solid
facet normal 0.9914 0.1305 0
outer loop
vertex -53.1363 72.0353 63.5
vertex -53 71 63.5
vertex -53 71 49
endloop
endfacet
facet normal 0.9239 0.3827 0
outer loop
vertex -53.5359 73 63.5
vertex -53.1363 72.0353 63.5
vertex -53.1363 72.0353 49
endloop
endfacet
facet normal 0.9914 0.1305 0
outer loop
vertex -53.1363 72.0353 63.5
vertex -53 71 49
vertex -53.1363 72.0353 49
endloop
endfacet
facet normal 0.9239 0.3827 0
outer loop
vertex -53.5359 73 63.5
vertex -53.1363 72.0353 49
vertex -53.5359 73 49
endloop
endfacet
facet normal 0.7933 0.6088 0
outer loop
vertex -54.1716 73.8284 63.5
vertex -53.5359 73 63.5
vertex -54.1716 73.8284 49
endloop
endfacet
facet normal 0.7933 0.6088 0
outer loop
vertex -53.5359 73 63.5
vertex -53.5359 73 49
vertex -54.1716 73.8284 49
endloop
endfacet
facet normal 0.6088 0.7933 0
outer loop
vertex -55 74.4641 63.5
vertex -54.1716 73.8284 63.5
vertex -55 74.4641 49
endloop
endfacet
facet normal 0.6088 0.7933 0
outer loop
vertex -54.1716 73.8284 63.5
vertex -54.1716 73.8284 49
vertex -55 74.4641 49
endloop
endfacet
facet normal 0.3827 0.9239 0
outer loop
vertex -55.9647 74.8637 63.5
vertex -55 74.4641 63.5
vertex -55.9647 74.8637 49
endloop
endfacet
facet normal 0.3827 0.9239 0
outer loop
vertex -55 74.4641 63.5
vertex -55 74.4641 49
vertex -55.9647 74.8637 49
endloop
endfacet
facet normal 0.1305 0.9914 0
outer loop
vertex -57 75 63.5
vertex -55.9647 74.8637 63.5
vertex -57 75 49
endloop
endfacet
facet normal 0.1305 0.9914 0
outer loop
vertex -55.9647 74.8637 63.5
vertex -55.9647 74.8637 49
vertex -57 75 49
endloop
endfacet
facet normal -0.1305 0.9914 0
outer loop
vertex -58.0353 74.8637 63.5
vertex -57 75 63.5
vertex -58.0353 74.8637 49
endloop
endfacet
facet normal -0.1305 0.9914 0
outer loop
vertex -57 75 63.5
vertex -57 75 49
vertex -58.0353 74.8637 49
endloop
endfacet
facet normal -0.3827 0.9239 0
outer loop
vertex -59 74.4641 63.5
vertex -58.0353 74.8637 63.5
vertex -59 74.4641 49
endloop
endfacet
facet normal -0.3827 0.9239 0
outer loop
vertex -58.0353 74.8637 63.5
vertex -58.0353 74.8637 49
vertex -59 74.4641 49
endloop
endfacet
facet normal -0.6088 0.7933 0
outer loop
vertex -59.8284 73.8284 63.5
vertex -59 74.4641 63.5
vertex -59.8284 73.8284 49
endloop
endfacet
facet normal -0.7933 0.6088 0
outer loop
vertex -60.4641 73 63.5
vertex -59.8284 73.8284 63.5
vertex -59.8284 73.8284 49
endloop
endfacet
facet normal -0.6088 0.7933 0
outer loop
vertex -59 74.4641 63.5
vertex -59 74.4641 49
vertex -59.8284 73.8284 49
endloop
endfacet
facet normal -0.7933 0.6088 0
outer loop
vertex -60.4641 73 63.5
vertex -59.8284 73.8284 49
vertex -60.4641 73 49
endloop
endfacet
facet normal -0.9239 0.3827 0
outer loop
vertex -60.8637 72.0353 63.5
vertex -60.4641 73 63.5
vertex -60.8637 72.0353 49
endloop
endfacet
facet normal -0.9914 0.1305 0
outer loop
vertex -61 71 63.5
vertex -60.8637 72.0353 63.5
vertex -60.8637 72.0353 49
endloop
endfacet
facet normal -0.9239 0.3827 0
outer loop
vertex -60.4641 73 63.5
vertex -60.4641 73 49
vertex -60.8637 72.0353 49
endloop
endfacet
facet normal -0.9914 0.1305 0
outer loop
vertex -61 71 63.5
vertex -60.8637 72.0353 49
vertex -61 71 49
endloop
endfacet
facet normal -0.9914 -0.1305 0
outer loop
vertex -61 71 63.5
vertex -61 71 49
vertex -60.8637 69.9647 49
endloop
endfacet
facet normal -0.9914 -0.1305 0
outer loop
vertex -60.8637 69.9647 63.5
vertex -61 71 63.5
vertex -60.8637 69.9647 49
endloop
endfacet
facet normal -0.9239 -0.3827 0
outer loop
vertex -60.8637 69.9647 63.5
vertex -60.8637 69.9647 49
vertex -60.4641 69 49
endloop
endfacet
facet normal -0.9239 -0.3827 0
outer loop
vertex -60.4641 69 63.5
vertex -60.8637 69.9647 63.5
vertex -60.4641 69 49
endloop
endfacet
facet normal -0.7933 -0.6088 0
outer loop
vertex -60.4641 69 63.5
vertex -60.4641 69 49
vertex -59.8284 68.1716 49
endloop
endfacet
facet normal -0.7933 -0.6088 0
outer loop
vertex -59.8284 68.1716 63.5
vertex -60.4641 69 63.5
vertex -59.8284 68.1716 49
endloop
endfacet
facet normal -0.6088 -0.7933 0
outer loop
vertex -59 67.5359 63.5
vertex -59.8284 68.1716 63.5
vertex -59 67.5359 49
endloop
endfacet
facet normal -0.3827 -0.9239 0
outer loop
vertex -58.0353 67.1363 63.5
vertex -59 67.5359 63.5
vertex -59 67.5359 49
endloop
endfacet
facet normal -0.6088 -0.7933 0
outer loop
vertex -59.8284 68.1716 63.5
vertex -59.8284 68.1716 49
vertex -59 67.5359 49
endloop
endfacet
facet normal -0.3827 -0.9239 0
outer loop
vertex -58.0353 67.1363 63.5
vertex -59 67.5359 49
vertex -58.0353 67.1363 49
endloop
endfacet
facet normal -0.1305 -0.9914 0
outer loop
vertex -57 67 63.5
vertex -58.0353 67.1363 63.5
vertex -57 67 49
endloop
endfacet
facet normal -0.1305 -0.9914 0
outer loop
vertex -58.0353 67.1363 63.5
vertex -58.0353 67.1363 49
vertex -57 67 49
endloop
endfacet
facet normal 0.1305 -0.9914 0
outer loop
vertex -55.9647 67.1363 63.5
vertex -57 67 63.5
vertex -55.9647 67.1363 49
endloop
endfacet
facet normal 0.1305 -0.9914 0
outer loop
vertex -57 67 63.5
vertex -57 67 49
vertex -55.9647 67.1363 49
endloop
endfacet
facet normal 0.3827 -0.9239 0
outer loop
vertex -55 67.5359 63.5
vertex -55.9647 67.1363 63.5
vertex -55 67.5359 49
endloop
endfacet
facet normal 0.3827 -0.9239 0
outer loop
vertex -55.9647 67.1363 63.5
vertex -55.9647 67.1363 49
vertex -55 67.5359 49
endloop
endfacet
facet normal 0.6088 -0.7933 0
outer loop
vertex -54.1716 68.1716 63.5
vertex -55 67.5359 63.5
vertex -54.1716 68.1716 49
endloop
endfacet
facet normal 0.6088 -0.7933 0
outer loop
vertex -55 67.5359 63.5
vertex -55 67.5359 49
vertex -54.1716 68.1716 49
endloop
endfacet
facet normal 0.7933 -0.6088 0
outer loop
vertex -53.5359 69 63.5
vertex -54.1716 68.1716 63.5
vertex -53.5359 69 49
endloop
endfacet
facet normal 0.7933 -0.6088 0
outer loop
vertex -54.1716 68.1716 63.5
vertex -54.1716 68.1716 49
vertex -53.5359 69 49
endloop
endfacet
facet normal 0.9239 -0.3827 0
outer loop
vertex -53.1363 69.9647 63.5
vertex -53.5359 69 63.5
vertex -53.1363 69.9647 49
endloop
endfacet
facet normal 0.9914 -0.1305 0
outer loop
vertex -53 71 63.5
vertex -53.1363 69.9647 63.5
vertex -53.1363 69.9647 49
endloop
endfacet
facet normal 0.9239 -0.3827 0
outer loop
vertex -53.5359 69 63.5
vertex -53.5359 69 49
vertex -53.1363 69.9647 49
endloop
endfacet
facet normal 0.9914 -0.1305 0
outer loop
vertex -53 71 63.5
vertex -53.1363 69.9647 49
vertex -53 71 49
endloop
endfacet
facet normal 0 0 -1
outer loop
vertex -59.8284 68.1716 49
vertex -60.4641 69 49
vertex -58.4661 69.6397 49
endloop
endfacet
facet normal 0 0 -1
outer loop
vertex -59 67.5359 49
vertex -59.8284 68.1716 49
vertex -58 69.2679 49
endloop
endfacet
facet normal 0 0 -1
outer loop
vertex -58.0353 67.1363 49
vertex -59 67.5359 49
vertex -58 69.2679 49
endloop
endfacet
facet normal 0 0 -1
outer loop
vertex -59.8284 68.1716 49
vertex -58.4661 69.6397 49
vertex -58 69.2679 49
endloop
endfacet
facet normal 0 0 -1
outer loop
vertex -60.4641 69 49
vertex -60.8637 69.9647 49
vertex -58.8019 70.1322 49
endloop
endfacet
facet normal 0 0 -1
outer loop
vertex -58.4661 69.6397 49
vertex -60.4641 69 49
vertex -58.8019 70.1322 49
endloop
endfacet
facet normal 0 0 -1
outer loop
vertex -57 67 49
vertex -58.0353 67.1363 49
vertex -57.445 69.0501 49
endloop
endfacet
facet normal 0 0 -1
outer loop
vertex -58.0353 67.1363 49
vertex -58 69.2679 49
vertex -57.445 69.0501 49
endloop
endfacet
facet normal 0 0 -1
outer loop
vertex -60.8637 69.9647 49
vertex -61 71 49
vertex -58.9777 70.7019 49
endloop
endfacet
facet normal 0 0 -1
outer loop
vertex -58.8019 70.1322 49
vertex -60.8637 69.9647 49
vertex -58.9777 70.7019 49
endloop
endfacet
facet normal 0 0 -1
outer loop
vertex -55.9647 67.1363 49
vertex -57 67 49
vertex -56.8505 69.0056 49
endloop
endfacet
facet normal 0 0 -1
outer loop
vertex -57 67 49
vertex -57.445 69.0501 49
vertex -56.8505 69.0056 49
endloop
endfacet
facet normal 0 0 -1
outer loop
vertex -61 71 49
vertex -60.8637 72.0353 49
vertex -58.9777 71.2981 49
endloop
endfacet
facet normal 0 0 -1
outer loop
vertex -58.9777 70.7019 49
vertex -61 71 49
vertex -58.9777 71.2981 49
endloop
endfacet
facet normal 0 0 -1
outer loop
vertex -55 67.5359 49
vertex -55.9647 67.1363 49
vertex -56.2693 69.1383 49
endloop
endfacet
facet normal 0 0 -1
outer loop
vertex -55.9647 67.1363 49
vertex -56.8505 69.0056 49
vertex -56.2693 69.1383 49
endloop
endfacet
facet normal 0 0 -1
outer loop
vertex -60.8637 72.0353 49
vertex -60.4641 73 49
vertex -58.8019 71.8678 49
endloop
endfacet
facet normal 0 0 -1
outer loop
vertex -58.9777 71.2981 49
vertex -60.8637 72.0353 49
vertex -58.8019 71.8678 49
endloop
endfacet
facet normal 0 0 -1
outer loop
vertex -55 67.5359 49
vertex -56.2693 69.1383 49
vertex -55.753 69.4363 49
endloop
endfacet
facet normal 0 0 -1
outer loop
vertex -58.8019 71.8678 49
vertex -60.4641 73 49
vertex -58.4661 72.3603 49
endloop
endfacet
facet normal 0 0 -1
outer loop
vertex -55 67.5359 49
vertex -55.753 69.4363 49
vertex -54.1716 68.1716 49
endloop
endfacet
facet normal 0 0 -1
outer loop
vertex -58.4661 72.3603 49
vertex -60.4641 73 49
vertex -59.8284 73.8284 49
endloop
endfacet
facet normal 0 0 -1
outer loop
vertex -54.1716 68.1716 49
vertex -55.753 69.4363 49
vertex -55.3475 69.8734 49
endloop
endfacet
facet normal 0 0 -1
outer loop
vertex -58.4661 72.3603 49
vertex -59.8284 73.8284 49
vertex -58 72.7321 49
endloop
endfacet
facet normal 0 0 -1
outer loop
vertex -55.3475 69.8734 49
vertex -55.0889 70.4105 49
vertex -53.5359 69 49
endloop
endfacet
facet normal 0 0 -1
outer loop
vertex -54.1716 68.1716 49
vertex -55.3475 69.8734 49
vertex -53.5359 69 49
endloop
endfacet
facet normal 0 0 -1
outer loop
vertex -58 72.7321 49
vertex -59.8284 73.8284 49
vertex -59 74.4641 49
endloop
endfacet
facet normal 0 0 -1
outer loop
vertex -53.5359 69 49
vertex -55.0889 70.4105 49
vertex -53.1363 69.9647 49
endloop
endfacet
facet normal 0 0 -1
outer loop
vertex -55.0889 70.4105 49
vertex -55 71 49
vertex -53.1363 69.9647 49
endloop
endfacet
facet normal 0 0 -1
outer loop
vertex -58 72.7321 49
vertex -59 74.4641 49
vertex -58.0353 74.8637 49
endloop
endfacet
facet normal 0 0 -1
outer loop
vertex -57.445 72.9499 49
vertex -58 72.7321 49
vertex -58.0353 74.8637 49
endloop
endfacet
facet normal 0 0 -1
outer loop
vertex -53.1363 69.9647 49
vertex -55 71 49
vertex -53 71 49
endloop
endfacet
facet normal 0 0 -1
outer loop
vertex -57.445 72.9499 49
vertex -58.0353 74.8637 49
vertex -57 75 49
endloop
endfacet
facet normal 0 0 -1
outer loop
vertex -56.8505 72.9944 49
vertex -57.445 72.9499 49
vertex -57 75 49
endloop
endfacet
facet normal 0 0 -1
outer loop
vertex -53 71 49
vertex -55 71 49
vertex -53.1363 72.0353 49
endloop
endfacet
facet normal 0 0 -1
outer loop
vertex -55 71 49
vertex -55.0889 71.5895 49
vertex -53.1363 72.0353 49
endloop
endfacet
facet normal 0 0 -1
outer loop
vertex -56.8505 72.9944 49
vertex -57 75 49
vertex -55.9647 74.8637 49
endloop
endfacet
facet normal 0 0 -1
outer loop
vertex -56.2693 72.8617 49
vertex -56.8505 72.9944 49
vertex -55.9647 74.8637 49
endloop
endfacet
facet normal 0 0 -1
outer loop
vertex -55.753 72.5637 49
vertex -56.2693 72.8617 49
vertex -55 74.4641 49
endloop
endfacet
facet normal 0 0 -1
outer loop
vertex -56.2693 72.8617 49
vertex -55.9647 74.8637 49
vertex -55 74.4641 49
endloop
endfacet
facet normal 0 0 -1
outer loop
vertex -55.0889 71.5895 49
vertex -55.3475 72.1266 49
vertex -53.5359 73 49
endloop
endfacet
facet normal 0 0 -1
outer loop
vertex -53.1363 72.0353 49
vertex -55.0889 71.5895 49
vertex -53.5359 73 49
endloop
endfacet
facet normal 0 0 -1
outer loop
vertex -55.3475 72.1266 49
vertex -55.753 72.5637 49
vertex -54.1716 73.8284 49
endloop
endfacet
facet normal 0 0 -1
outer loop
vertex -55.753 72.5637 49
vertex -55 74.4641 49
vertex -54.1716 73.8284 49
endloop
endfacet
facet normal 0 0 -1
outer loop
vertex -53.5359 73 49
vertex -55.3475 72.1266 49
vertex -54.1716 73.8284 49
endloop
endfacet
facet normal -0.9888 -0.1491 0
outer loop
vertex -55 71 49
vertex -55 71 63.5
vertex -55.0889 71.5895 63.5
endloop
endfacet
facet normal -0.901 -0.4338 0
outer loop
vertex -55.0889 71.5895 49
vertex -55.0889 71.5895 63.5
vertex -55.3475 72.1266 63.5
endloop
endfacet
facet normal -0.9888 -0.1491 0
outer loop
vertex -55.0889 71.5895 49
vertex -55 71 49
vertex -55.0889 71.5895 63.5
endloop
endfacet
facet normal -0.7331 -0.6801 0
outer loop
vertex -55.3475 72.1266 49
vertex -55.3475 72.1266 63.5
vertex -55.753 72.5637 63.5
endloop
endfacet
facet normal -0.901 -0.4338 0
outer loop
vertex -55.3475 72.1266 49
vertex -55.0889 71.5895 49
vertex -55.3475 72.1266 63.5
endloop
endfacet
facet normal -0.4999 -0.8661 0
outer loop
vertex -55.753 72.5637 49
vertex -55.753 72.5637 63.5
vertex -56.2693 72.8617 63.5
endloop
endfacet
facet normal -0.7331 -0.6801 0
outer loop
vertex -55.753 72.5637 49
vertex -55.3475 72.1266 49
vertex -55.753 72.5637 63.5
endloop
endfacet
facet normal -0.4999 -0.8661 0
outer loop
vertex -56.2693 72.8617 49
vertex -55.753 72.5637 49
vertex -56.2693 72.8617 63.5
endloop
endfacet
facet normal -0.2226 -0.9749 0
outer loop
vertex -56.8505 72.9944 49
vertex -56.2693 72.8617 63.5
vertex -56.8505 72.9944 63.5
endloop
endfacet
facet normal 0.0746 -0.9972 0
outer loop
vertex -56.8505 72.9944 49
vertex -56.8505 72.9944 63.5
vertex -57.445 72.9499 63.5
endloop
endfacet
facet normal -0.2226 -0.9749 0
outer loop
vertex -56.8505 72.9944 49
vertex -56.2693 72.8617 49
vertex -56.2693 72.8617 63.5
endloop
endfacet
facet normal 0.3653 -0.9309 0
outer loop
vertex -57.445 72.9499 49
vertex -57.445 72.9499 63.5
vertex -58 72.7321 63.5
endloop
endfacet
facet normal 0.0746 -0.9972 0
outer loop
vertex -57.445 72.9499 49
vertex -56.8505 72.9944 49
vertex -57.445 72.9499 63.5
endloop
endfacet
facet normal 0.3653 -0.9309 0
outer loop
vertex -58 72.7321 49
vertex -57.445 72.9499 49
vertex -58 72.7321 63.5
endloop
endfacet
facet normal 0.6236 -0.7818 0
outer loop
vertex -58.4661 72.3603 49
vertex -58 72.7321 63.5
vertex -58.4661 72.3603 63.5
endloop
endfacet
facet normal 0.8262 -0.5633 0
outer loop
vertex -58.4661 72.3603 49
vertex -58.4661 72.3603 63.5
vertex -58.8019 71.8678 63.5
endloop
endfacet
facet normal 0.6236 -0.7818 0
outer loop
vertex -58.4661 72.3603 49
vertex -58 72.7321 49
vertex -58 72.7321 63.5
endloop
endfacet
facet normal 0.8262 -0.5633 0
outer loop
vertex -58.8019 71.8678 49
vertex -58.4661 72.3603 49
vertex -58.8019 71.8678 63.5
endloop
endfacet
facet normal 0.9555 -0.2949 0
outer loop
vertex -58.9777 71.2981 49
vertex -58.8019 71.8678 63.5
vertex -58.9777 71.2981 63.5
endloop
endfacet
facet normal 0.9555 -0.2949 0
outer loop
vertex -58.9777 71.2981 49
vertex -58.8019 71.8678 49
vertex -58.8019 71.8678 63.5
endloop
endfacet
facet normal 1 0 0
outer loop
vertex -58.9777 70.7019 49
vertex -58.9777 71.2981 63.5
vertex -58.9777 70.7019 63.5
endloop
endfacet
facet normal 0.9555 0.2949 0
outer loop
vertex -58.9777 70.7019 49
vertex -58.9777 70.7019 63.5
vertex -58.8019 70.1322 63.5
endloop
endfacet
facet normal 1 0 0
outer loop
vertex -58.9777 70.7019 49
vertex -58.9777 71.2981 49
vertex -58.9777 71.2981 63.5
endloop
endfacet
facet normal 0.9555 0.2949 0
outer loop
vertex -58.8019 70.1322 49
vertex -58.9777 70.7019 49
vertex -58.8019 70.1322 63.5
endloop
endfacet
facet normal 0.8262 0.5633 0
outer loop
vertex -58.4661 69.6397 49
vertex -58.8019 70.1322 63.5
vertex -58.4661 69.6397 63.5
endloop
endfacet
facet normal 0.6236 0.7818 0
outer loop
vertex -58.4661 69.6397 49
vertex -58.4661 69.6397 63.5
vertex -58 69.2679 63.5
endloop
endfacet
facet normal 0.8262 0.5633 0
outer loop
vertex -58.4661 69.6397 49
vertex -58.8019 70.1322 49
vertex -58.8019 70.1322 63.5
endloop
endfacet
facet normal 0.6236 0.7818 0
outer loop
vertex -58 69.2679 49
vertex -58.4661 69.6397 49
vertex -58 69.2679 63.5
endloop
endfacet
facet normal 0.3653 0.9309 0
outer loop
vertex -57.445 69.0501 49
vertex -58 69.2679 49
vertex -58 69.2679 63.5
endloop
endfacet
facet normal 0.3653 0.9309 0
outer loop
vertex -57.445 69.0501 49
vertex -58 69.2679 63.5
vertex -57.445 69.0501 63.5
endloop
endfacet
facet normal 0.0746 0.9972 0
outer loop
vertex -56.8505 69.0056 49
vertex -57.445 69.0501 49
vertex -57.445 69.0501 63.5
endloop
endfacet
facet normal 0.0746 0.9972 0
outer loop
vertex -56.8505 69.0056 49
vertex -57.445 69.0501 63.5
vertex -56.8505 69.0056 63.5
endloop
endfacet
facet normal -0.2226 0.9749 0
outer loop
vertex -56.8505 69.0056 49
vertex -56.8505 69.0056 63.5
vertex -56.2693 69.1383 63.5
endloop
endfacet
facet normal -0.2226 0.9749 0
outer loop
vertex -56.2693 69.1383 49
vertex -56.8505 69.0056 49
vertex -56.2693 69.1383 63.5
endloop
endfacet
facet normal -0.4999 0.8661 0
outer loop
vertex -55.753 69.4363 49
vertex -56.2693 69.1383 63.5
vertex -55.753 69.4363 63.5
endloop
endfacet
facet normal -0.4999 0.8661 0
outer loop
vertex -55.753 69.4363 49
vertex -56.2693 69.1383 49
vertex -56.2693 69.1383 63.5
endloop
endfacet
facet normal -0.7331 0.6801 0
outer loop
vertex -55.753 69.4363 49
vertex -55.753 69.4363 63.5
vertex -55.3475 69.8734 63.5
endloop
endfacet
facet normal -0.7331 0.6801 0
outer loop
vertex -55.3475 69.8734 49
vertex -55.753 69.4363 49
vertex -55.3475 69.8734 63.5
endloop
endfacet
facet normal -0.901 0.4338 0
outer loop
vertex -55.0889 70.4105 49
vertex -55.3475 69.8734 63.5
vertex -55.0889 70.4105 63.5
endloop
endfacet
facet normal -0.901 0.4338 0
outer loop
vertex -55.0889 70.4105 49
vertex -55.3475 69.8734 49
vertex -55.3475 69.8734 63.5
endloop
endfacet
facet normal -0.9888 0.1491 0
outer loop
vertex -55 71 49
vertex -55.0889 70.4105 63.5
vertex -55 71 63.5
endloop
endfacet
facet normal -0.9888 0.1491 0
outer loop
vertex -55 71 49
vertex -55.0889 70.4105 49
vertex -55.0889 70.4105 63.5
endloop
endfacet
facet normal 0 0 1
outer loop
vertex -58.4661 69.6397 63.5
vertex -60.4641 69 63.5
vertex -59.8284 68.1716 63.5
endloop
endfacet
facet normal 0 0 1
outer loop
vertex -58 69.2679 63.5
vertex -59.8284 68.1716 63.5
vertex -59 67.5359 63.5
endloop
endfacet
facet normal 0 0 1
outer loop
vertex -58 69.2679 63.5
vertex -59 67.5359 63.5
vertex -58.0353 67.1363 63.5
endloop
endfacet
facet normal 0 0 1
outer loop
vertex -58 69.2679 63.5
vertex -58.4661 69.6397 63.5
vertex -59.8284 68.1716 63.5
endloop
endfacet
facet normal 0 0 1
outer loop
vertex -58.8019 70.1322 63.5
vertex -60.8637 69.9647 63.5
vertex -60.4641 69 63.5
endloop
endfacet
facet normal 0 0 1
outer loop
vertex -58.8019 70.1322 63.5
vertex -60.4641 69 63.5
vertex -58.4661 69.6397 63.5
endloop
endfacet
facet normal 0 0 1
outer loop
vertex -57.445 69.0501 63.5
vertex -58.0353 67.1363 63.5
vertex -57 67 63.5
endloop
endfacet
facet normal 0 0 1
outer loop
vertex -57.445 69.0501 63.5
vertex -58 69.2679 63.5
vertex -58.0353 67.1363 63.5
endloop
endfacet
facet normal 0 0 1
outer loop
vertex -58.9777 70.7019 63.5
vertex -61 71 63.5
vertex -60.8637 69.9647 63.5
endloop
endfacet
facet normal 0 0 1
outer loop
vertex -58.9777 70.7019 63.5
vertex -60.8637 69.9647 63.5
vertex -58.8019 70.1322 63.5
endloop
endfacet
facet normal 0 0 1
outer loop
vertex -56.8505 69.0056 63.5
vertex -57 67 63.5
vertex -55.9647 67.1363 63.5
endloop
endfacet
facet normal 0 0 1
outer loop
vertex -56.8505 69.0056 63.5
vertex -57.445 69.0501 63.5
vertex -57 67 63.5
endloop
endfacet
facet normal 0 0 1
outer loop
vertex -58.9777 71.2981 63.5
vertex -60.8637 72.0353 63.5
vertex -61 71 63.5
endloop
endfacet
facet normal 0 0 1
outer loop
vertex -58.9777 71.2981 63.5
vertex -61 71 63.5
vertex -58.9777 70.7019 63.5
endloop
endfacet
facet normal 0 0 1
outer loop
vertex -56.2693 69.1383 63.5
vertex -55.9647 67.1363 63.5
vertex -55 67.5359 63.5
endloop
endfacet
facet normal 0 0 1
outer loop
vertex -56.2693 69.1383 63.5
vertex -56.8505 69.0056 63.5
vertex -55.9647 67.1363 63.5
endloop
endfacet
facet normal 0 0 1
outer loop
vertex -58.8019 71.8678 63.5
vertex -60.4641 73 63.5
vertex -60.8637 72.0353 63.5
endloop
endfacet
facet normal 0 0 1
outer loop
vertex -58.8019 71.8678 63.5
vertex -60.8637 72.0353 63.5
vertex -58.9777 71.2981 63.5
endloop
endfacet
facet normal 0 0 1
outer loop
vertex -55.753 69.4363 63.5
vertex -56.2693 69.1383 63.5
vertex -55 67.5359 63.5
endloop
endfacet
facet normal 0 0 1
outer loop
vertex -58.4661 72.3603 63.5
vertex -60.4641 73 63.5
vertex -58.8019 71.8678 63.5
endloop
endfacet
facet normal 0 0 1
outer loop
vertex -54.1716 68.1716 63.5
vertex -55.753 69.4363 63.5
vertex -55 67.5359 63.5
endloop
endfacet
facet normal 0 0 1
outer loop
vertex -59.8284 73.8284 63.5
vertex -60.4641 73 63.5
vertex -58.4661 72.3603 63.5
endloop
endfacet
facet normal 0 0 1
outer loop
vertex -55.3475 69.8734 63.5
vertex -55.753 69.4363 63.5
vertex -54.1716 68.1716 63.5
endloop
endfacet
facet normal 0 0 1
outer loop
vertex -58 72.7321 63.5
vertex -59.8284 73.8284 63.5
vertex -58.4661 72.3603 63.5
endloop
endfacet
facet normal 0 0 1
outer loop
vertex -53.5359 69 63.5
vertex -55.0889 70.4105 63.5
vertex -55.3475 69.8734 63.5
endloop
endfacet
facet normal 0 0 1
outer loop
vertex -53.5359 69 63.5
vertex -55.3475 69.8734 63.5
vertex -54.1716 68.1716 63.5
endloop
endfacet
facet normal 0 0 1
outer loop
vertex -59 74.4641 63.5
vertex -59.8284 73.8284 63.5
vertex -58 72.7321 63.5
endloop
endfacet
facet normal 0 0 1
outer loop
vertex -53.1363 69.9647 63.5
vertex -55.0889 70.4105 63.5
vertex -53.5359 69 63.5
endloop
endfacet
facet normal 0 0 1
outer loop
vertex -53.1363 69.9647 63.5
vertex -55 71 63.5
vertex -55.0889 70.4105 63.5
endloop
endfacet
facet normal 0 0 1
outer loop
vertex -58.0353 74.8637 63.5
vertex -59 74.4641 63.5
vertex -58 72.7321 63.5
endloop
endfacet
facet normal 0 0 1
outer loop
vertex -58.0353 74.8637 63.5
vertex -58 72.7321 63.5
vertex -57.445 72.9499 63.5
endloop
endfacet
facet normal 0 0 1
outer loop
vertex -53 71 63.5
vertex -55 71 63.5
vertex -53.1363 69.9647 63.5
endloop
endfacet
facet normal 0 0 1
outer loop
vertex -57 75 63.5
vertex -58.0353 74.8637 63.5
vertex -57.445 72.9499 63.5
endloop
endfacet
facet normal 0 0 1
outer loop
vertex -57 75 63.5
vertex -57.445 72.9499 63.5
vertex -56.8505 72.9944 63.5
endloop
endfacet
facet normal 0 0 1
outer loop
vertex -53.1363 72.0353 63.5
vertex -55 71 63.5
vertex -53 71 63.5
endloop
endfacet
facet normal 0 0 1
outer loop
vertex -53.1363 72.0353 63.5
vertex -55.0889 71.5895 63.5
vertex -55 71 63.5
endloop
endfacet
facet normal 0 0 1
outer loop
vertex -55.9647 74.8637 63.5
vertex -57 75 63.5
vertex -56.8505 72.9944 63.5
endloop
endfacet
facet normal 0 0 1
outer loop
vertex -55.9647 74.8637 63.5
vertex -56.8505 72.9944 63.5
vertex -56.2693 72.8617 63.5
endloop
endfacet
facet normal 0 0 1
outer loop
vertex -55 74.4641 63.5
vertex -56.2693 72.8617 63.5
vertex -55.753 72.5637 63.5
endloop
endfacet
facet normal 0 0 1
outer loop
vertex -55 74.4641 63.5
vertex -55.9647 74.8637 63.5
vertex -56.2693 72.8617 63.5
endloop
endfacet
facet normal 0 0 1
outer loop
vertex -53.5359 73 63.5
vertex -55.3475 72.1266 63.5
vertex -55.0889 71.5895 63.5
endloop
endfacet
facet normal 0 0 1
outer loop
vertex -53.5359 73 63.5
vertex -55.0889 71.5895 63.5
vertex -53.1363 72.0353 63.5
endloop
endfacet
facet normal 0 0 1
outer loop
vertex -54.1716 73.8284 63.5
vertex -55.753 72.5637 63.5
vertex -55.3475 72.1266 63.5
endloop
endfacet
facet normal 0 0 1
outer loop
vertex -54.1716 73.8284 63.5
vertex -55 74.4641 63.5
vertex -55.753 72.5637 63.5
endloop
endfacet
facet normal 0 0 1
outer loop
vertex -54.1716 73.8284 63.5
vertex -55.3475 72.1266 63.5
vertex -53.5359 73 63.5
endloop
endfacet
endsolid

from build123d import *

# Parameters (mm, degrees)
CYLINDER_R        = 2
CYLINDER_DEPTH    = 14.5
CYLINDER001_R     = 4
CYLINDER001_DEPTH = 14.5


with BuildPart() as cylinder:
    # Cylinder → Cylinder (new body)
    with BuildSketch(Plane.XY):
        Circle(CYLINDER_R)
    extrude(amount=CYLINDER_DEPTH)


with BuildPart() as spacer1:
    # Cylinder001 → Cylinder001 (new body)
    with BuildSketch(Plane.XY):
        Circle(CYLINDER001_R)
    extrude(amount=CYLINDER001_DEPTH)

    # Cut: cut Cylinder
    add(cylinder.part, mode=Mode.SUBTRACT)


with BuildPart() as spacer1_1:
    # Cut placement: moved
    add(spacer1.part.moved(Location((-57, 71, 49))))


solid = spacer1_1.part
